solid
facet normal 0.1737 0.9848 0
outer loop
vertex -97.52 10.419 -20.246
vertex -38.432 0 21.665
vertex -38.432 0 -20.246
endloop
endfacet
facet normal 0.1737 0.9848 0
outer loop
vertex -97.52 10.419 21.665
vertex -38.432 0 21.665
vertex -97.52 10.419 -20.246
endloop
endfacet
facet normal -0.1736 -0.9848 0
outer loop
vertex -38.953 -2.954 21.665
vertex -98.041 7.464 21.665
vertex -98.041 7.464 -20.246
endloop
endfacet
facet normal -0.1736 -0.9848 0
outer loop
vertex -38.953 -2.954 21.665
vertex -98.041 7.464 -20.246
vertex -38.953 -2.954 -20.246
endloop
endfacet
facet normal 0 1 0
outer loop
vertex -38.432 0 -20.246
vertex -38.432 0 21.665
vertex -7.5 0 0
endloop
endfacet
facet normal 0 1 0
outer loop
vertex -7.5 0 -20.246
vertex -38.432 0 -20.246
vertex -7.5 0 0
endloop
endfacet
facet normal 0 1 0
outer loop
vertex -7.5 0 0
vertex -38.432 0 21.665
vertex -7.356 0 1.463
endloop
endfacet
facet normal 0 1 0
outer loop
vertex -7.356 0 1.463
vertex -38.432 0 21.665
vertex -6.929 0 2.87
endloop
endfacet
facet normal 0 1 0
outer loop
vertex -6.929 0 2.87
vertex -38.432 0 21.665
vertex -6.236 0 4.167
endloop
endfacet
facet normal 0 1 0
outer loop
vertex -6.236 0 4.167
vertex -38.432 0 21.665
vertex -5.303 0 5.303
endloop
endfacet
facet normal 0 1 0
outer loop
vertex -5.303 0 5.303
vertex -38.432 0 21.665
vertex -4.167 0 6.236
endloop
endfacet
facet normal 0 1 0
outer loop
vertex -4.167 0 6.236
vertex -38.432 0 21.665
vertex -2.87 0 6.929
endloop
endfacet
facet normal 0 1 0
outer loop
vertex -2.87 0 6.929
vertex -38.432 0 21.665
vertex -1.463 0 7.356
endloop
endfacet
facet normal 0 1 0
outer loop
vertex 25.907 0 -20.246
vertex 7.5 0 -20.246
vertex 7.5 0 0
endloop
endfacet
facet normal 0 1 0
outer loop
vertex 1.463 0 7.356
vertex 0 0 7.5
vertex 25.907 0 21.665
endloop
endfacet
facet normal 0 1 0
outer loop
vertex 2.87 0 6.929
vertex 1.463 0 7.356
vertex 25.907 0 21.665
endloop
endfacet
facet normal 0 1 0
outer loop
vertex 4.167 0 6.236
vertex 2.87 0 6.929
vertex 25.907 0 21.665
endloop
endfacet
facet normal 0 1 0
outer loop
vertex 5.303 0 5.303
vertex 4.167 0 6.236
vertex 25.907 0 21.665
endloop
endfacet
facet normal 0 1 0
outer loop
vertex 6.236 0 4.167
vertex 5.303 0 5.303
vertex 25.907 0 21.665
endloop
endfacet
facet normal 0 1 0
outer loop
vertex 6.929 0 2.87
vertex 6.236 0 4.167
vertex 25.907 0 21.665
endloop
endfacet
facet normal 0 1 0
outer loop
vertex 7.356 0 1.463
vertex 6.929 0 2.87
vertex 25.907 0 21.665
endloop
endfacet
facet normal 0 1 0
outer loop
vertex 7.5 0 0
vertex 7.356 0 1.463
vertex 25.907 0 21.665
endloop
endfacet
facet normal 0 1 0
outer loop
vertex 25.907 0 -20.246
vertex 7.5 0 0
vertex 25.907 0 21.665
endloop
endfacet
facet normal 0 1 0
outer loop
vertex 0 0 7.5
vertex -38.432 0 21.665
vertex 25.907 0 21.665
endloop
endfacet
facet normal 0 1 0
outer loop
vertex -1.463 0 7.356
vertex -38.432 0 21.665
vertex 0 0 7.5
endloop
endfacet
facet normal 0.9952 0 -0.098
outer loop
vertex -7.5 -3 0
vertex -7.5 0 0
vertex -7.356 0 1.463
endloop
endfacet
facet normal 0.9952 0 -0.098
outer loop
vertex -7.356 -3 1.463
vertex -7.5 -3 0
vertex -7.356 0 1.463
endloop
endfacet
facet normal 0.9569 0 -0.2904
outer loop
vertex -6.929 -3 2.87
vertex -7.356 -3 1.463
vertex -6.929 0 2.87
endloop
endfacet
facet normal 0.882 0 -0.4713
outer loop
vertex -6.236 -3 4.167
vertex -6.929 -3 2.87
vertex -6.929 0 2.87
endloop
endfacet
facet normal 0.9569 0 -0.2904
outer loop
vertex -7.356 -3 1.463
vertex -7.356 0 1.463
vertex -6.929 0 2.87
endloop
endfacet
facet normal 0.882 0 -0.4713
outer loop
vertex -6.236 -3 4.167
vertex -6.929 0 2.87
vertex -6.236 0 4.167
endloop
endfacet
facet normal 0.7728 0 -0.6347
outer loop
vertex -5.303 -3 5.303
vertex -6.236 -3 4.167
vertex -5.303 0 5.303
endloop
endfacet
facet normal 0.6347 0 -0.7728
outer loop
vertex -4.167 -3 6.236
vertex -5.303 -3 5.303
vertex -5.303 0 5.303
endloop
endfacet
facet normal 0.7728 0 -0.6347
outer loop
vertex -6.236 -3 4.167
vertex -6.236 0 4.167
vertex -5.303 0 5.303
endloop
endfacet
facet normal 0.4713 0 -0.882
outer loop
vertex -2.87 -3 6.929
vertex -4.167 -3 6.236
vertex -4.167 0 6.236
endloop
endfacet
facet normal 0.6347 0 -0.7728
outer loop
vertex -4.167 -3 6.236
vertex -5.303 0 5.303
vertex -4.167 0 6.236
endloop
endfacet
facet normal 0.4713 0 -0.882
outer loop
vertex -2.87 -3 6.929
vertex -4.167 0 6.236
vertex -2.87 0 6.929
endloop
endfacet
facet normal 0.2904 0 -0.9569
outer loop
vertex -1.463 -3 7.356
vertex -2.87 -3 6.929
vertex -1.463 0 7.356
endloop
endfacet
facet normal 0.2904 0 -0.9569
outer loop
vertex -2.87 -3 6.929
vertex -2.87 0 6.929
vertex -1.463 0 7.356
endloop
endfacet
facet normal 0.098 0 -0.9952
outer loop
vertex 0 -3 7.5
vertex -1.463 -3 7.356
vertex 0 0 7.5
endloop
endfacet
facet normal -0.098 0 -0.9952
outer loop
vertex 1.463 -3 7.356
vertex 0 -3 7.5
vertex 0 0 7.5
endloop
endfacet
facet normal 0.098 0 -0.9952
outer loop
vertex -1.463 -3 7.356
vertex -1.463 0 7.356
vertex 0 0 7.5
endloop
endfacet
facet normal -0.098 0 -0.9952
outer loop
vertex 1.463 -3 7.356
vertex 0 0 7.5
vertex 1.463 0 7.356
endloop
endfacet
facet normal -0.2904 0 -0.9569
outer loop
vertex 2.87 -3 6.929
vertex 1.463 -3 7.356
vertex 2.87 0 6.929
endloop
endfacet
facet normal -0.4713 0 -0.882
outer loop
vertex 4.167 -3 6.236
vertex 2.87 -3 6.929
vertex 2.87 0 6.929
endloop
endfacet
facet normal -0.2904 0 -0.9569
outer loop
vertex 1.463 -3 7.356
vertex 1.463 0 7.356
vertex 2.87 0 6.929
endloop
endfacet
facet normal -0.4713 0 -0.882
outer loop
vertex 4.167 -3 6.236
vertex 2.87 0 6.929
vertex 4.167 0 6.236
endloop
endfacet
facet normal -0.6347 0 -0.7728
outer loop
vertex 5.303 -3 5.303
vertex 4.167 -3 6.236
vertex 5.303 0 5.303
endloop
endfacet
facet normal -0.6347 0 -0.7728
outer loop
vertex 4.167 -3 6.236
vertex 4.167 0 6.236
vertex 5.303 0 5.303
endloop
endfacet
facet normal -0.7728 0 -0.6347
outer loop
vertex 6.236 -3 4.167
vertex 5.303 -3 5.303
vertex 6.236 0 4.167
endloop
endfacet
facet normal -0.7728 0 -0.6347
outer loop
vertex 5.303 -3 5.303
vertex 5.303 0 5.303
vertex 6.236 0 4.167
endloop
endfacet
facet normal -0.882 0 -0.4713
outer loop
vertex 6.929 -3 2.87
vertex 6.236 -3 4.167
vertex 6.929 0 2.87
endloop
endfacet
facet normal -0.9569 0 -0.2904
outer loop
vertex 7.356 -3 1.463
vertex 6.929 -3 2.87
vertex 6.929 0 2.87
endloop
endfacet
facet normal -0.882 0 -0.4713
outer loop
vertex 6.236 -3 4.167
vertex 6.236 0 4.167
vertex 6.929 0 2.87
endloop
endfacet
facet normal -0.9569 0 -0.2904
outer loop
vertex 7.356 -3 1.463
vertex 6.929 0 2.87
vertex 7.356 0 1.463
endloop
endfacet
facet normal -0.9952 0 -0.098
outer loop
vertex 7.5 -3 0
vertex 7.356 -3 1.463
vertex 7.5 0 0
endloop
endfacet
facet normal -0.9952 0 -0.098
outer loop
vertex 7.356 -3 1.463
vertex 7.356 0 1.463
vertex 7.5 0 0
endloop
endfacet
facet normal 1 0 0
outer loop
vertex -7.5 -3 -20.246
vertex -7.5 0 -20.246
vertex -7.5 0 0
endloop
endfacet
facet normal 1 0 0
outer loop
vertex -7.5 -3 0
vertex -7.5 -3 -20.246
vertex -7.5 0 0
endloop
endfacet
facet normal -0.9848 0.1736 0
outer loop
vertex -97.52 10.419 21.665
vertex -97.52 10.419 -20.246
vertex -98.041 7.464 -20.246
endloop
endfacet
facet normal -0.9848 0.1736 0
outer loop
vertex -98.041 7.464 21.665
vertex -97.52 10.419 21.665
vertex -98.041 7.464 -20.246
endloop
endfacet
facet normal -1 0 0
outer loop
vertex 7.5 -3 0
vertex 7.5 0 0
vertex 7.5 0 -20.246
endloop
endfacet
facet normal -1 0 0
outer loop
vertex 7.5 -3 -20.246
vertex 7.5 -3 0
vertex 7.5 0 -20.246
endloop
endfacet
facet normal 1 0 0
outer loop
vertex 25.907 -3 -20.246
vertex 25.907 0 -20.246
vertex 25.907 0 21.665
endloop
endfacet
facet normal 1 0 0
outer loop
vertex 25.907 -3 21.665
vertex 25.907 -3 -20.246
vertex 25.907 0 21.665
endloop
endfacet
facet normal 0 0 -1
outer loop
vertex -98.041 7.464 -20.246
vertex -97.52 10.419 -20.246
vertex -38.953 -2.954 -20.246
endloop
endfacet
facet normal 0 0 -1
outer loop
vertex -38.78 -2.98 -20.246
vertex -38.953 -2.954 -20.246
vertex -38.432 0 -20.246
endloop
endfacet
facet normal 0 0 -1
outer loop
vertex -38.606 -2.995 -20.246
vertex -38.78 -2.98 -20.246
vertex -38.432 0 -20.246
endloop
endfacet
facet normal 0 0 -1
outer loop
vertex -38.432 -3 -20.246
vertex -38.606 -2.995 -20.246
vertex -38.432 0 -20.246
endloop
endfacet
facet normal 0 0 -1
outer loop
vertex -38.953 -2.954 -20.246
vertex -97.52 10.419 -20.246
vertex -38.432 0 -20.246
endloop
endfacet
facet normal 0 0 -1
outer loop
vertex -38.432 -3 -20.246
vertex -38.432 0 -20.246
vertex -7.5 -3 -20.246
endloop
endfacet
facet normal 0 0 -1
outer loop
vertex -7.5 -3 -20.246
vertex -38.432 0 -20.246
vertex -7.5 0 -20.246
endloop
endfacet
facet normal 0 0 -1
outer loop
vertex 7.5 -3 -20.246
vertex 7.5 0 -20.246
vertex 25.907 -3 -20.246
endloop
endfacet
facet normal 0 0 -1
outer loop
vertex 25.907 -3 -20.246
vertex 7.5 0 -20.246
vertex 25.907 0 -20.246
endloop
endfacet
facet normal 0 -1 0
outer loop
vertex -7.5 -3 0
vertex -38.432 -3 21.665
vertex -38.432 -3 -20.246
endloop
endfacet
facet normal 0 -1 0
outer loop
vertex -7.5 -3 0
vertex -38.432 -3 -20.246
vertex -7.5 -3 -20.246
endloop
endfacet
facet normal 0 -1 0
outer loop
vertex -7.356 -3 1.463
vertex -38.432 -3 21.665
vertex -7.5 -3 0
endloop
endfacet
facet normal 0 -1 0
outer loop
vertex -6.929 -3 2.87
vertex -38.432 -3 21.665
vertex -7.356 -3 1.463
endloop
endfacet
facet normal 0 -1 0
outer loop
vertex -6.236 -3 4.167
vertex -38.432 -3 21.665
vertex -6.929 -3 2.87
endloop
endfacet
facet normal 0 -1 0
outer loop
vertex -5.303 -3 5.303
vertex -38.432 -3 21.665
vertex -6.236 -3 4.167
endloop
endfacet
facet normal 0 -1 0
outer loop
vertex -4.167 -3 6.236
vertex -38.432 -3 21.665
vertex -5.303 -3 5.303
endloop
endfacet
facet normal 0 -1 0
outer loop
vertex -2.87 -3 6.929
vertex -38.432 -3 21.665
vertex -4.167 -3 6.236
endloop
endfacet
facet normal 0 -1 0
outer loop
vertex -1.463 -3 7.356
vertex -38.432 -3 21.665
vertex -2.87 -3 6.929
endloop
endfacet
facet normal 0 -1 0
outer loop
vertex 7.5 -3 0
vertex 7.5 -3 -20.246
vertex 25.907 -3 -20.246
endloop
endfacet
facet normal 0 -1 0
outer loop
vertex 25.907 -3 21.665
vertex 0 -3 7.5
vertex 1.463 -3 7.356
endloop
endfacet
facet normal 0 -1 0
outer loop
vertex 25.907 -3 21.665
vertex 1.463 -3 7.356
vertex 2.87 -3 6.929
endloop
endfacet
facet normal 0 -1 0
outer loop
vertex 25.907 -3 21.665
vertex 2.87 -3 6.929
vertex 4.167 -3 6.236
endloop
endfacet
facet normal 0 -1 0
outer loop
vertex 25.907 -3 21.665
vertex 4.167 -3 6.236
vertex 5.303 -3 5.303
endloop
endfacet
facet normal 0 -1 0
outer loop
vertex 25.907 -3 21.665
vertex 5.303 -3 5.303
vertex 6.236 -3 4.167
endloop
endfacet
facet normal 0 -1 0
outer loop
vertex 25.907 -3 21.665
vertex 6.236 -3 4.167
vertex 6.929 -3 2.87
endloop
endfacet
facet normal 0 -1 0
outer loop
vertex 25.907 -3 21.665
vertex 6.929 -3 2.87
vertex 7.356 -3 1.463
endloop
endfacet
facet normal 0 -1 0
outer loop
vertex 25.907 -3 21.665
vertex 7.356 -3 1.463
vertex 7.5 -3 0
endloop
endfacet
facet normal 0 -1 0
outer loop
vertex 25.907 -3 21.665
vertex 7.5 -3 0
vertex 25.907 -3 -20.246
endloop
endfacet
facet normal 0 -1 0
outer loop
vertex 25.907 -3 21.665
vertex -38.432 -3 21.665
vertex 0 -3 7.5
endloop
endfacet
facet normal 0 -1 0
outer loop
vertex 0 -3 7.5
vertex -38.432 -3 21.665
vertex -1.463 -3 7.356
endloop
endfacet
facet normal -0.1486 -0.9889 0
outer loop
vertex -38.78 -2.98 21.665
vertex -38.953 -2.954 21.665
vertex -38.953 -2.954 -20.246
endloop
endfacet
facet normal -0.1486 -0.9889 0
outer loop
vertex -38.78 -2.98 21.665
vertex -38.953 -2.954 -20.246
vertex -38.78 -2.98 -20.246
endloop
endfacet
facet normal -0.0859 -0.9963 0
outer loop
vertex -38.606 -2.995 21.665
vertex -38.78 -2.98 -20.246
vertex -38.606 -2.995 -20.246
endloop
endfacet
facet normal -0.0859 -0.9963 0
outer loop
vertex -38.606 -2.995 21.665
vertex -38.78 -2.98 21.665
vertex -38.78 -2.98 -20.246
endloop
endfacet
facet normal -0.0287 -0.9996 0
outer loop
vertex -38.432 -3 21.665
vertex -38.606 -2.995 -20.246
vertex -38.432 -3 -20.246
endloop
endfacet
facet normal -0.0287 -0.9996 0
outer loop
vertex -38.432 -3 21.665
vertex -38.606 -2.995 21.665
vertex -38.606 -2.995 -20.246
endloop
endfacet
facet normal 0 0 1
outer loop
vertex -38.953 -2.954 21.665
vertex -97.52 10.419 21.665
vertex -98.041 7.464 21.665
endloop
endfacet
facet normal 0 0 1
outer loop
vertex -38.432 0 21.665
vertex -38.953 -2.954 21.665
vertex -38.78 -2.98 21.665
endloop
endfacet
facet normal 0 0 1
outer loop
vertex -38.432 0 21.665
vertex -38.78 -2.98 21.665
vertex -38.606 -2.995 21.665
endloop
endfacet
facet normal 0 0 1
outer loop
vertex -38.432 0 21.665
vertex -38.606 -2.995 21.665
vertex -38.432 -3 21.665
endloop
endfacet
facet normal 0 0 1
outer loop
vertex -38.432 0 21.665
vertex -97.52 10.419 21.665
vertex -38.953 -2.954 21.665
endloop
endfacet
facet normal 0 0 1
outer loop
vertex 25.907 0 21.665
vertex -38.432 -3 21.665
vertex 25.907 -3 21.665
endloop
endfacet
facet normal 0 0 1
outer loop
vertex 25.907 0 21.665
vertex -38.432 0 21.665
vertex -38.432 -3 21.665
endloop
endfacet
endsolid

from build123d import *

# Parameters (mm, degrees)
F1_DEPTH      = 3
F3_DEPTH      = 21.6650813818
F3_DEPTH_BACK = 20.2457859941


with BuildPart() as f1:
    # F0 (on Front) → F1 (new body)
    with BuildSketch(Plane.XZ):
        with BuildLine():
            ThreePointArc((-7.5, 0), (0, 7.5), (7.5, 0))
            Line((7.5, 0), (7.5, -20.2457859941))
            Line((7.5, -20.2457859941), (25.9074462614, -20.2457859941))
            Line((25.9074462614, -20.2457859941), (25.9074462614, 21.6650813818))
            Line((25.9074462614, 21.6650813818), (-38.4318618068, 21.6650813818))
            Line((-38.4318618068, 21.6650813818), (-38.4318618068, -20.2457859941))
            Line((-38.4318618068, -20.2457859941), (-7.5, -20.2457859941))
            Line((-7.5, -20.2457859941), (-7.5, 0))
        make_face()
    extrude(amount=F1_DEPTH)

    # F2 (on Top) → F3 (join, two sides)
    with BuildSketch(Plane.XY) as f3_sk:
        with BuildLine():
            Line((-38.4318618068, -3), (-38.4318618068, 0))
            Line((-38.4318618068, 0), (-97.5203269875, 10.41889066))
            Line((-97.5203269875, 10.41889066), (-98.0412715205, 7.464467401))
            Line((-98.0412715205, 7.464467401), (-38.9528063398, -2.954423259))
            ThreePointArc((-38.9528063398, -2.954423259), (-38.693329035, -2.9885840943), (-38.4318618068, -3))
        make_face()
    extrude(amount=F3_DEPTH)
    extrude(f3_sk.sketch, amount=-F3_DEPTH_BACK)


solid = f1.part
